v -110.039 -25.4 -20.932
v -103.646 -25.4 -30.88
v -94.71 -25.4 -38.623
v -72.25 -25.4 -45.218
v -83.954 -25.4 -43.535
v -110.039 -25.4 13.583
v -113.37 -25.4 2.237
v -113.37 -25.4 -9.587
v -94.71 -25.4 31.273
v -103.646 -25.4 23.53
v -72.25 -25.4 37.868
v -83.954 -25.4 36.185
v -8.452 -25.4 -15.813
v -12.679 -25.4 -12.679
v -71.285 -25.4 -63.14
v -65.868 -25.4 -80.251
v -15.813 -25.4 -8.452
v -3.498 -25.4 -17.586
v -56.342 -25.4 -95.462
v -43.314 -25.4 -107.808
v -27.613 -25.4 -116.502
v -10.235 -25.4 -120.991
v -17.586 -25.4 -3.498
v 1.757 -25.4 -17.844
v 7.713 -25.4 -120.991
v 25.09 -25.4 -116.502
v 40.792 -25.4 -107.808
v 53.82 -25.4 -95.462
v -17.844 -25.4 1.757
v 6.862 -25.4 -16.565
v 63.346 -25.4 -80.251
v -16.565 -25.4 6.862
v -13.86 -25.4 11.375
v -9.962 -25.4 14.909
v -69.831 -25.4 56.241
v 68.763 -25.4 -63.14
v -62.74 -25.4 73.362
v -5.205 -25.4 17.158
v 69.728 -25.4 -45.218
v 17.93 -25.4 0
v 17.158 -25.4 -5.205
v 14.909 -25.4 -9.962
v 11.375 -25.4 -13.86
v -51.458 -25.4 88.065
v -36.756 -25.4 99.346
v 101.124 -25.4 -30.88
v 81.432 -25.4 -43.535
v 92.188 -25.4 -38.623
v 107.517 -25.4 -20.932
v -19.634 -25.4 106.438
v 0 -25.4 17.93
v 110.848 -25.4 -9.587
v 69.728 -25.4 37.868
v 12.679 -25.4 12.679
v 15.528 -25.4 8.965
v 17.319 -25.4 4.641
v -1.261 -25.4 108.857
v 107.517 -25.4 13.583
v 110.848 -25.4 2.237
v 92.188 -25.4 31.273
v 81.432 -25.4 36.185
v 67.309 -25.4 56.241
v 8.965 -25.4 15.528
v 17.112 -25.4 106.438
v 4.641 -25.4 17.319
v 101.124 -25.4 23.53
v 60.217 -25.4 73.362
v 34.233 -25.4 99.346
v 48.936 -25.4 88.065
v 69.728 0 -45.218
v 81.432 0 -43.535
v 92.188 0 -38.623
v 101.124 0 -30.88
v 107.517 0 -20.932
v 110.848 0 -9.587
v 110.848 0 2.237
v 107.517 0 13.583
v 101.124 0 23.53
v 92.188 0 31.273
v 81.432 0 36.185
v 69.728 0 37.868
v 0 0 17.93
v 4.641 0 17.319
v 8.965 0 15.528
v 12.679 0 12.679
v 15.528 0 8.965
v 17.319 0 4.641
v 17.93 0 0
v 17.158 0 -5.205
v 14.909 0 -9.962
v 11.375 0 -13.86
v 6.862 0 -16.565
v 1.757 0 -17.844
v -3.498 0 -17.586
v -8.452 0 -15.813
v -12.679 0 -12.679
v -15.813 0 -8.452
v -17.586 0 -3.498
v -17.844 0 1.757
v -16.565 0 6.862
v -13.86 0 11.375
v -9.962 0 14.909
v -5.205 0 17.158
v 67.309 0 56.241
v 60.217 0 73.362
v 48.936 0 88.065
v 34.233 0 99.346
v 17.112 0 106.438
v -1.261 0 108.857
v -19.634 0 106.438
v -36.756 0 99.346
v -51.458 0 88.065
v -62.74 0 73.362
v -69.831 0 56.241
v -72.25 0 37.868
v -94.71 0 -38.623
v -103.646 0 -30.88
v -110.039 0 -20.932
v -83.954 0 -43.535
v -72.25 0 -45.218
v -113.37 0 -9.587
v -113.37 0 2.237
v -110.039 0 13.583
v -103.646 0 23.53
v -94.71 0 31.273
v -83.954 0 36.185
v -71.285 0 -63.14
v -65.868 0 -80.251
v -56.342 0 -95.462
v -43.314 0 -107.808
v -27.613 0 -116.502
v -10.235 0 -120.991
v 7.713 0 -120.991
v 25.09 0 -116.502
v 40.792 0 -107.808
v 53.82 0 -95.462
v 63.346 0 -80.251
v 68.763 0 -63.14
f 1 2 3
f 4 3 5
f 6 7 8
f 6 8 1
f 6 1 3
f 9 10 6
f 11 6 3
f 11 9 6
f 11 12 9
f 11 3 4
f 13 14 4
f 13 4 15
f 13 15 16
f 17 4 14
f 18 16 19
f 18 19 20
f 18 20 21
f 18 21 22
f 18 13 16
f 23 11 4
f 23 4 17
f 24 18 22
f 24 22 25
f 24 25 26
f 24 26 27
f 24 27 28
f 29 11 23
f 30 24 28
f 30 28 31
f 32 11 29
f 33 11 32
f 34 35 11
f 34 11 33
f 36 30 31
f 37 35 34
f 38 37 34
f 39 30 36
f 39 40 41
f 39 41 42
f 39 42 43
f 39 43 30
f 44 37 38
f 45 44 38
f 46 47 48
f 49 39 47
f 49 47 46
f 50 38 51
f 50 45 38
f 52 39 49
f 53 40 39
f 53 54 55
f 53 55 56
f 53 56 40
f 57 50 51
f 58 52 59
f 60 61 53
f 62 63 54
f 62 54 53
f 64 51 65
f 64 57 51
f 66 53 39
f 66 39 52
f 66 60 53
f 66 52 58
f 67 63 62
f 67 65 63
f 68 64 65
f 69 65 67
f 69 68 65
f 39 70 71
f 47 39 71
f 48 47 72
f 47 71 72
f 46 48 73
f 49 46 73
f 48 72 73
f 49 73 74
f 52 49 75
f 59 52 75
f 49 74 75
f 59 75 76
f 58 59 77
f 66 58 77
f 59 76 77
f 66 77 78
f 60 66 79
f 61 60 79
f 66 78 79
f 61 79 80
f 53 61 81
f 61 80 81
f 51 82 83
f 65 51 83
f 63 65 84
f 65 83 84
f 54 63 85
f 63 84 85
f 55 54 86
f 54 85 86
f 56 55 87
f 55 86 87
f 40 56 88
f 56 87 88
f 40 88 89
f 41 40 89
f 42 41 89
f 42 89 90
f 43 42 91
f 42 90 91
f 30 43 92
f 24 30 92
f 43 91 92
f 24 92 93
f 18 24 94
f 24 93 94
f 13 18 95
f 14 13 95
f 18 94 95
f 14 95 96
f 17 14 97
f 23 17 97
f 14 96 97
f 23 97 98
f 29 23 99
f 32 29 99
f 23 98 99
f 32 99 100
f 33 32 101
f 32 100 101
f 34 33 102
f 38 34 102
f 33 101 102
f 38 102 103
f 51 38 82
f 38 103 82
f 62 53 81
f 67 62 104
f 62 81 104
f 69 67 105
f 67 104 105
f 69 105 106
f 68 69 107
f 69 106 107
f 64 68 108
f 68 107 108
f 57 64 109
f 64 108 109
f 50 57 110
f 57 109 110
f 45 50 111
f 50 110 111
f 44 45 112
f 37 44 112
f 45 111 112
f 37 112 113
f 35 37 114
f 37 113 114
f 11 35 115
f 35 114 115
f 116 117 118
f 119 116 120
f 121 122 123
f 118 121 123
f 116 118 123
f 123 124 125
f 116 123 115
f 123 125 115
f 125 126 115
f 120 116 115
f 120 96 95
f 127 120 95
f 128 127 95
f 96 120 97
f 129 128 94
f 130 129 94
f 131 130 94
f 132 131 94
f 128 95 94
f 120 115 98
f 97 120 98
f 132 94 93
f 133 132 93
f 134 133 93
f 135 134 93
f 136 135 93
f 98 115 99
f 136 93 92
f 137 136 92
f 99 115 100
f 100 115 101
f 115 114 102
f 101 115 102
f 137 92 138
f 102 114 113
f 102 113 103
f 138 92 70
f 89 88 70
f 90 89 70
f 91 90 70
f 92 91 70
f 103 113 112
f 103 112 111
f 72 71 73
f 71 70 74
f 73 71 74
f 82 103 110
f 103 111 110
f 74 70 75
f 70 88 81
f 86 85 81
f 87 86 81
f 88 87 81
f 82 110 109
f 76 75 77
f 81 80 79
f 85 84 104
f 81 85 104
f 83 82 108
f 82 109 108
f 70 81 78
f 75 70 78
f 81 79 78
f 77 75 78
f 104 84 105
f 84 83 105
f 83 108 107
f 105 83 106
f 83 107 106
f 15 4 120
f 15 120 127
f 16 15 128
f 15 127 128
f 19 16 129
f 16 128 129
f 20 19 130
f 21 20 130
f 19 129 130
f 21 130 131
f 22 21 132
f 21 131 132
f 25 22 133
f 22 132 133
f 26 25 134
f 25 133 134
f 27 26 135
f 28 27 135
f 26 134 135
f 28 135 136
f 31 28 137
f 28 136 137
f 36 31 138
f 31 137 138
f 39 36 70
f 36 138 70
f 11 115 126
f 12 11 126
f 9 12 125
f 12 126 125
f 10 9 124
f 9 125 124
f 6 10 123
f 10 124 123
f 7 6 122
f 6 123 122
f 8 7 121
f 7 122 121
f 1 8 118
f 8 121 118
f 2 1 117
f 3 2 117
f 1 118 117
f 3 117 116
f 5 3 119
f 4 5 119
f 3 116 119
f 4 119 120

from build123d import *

# Parameters (mm, degrees)
F1_DEPTH = 25.4


with BuildPart() as f1:
    # F0 (on Front) → F1 (new body)
    with BuildSketch(Plane.XZ):
        with BuildLine():
            ThreePointArc((69.7280094028, 37.8677658737), (-1.2611225247, 108.8568978012), (-72.2502544522, 37.8677658737))
            Line((-72.2502544522, 37.8677658737), (-51.3892844319, 37.8677658737))
            Line((-51.3892844319, 37.8677658737), (0, 37.8677658737))
            Line((0, 37.8677658737), (69.7280094028, 37.8677658737))
        make_face()
        Polygon((-51.3892844319, 37.8677658737), (-72.2502544522, 37.8677658737), (-72.2502544522, -45.2175028622), (69.7280094028, -45.2175028622), (69.7280094028, -29.6100229025), (-51.3892844319, -29.6100229025), align=None)
        with BuildLine():
            Line((-72.2502544522, -45.2175028622), (-72.2502544522, 37.8677658737))
            ThreePointArc((-72.2502544522, 37.8677658737), (-113.7928888202, -3.6748684943), (-72.2502544522, -45.2175028622))
        make_face()
        with BuildLine():
            Line((0, 37.8677658737), (-51.3892844319, 37.8677658737))
            Line((-51.3892844319, 37.8677658737), (-51.3892844319, -29.6100229025))
            Line((-51.3892844319, -29.6100229025), (69.7280094028, -29.6100229025))
            Line((69.7280094028, -29.6100229025), (69.7280094028, 0))
            Line((69.7280094028, 0), (17.9303269799, 0))
            ThreePointArc((17.9303269799, 0), (-12.6786557964, -12.6786557964), (0, 17.9303269799))
            Line((0, 17.9303269799), (0, 37.8677658737))
        make_face()
        with BuildLine():
            Line((69.7280094028, -45.2175028622), (-72.2502544522, -45.2175028622))
            ThreePointArc((-72.2502544522, -45.2175028622), (-1.2611225247, -121.5592398304), (69.7280094028, -45.2175028622))
        make_face()
        with BuildLine():
            Line((69.7280094028, 0), (69.7280094028, 37.8677658737))
            Line((69.7280094028, 37.8677658737), (0, 37.8677658737))
            Line((0, 37.8677658737), (0, 17.9303269799))
            ThreePointArc((0, 17.9303269799), (12.6786557964, 12.6786557964), (17.9303269799, 0))
            Line((17.9303269799, 0), (69.7280094028, 0))
        make_face()
        with BuildLine():
            ThreePointArc((69.7280094028, -45.2175028622), (111.2706437707, -3.6748684943), (69.7280094028, 37.8677658737))
            Line((69.7280094028, 37.8677658737), (69.7280094028, 0))
            Line((69.7280094028, 0), (69.7280094028, -29.6100229025))
            Line((69.7280094028, -29.6100229025), (69.7280094028, -45.2175028622))
        make_face()
    extrude(amount=F1_DEPTH)


solid = f1.part
